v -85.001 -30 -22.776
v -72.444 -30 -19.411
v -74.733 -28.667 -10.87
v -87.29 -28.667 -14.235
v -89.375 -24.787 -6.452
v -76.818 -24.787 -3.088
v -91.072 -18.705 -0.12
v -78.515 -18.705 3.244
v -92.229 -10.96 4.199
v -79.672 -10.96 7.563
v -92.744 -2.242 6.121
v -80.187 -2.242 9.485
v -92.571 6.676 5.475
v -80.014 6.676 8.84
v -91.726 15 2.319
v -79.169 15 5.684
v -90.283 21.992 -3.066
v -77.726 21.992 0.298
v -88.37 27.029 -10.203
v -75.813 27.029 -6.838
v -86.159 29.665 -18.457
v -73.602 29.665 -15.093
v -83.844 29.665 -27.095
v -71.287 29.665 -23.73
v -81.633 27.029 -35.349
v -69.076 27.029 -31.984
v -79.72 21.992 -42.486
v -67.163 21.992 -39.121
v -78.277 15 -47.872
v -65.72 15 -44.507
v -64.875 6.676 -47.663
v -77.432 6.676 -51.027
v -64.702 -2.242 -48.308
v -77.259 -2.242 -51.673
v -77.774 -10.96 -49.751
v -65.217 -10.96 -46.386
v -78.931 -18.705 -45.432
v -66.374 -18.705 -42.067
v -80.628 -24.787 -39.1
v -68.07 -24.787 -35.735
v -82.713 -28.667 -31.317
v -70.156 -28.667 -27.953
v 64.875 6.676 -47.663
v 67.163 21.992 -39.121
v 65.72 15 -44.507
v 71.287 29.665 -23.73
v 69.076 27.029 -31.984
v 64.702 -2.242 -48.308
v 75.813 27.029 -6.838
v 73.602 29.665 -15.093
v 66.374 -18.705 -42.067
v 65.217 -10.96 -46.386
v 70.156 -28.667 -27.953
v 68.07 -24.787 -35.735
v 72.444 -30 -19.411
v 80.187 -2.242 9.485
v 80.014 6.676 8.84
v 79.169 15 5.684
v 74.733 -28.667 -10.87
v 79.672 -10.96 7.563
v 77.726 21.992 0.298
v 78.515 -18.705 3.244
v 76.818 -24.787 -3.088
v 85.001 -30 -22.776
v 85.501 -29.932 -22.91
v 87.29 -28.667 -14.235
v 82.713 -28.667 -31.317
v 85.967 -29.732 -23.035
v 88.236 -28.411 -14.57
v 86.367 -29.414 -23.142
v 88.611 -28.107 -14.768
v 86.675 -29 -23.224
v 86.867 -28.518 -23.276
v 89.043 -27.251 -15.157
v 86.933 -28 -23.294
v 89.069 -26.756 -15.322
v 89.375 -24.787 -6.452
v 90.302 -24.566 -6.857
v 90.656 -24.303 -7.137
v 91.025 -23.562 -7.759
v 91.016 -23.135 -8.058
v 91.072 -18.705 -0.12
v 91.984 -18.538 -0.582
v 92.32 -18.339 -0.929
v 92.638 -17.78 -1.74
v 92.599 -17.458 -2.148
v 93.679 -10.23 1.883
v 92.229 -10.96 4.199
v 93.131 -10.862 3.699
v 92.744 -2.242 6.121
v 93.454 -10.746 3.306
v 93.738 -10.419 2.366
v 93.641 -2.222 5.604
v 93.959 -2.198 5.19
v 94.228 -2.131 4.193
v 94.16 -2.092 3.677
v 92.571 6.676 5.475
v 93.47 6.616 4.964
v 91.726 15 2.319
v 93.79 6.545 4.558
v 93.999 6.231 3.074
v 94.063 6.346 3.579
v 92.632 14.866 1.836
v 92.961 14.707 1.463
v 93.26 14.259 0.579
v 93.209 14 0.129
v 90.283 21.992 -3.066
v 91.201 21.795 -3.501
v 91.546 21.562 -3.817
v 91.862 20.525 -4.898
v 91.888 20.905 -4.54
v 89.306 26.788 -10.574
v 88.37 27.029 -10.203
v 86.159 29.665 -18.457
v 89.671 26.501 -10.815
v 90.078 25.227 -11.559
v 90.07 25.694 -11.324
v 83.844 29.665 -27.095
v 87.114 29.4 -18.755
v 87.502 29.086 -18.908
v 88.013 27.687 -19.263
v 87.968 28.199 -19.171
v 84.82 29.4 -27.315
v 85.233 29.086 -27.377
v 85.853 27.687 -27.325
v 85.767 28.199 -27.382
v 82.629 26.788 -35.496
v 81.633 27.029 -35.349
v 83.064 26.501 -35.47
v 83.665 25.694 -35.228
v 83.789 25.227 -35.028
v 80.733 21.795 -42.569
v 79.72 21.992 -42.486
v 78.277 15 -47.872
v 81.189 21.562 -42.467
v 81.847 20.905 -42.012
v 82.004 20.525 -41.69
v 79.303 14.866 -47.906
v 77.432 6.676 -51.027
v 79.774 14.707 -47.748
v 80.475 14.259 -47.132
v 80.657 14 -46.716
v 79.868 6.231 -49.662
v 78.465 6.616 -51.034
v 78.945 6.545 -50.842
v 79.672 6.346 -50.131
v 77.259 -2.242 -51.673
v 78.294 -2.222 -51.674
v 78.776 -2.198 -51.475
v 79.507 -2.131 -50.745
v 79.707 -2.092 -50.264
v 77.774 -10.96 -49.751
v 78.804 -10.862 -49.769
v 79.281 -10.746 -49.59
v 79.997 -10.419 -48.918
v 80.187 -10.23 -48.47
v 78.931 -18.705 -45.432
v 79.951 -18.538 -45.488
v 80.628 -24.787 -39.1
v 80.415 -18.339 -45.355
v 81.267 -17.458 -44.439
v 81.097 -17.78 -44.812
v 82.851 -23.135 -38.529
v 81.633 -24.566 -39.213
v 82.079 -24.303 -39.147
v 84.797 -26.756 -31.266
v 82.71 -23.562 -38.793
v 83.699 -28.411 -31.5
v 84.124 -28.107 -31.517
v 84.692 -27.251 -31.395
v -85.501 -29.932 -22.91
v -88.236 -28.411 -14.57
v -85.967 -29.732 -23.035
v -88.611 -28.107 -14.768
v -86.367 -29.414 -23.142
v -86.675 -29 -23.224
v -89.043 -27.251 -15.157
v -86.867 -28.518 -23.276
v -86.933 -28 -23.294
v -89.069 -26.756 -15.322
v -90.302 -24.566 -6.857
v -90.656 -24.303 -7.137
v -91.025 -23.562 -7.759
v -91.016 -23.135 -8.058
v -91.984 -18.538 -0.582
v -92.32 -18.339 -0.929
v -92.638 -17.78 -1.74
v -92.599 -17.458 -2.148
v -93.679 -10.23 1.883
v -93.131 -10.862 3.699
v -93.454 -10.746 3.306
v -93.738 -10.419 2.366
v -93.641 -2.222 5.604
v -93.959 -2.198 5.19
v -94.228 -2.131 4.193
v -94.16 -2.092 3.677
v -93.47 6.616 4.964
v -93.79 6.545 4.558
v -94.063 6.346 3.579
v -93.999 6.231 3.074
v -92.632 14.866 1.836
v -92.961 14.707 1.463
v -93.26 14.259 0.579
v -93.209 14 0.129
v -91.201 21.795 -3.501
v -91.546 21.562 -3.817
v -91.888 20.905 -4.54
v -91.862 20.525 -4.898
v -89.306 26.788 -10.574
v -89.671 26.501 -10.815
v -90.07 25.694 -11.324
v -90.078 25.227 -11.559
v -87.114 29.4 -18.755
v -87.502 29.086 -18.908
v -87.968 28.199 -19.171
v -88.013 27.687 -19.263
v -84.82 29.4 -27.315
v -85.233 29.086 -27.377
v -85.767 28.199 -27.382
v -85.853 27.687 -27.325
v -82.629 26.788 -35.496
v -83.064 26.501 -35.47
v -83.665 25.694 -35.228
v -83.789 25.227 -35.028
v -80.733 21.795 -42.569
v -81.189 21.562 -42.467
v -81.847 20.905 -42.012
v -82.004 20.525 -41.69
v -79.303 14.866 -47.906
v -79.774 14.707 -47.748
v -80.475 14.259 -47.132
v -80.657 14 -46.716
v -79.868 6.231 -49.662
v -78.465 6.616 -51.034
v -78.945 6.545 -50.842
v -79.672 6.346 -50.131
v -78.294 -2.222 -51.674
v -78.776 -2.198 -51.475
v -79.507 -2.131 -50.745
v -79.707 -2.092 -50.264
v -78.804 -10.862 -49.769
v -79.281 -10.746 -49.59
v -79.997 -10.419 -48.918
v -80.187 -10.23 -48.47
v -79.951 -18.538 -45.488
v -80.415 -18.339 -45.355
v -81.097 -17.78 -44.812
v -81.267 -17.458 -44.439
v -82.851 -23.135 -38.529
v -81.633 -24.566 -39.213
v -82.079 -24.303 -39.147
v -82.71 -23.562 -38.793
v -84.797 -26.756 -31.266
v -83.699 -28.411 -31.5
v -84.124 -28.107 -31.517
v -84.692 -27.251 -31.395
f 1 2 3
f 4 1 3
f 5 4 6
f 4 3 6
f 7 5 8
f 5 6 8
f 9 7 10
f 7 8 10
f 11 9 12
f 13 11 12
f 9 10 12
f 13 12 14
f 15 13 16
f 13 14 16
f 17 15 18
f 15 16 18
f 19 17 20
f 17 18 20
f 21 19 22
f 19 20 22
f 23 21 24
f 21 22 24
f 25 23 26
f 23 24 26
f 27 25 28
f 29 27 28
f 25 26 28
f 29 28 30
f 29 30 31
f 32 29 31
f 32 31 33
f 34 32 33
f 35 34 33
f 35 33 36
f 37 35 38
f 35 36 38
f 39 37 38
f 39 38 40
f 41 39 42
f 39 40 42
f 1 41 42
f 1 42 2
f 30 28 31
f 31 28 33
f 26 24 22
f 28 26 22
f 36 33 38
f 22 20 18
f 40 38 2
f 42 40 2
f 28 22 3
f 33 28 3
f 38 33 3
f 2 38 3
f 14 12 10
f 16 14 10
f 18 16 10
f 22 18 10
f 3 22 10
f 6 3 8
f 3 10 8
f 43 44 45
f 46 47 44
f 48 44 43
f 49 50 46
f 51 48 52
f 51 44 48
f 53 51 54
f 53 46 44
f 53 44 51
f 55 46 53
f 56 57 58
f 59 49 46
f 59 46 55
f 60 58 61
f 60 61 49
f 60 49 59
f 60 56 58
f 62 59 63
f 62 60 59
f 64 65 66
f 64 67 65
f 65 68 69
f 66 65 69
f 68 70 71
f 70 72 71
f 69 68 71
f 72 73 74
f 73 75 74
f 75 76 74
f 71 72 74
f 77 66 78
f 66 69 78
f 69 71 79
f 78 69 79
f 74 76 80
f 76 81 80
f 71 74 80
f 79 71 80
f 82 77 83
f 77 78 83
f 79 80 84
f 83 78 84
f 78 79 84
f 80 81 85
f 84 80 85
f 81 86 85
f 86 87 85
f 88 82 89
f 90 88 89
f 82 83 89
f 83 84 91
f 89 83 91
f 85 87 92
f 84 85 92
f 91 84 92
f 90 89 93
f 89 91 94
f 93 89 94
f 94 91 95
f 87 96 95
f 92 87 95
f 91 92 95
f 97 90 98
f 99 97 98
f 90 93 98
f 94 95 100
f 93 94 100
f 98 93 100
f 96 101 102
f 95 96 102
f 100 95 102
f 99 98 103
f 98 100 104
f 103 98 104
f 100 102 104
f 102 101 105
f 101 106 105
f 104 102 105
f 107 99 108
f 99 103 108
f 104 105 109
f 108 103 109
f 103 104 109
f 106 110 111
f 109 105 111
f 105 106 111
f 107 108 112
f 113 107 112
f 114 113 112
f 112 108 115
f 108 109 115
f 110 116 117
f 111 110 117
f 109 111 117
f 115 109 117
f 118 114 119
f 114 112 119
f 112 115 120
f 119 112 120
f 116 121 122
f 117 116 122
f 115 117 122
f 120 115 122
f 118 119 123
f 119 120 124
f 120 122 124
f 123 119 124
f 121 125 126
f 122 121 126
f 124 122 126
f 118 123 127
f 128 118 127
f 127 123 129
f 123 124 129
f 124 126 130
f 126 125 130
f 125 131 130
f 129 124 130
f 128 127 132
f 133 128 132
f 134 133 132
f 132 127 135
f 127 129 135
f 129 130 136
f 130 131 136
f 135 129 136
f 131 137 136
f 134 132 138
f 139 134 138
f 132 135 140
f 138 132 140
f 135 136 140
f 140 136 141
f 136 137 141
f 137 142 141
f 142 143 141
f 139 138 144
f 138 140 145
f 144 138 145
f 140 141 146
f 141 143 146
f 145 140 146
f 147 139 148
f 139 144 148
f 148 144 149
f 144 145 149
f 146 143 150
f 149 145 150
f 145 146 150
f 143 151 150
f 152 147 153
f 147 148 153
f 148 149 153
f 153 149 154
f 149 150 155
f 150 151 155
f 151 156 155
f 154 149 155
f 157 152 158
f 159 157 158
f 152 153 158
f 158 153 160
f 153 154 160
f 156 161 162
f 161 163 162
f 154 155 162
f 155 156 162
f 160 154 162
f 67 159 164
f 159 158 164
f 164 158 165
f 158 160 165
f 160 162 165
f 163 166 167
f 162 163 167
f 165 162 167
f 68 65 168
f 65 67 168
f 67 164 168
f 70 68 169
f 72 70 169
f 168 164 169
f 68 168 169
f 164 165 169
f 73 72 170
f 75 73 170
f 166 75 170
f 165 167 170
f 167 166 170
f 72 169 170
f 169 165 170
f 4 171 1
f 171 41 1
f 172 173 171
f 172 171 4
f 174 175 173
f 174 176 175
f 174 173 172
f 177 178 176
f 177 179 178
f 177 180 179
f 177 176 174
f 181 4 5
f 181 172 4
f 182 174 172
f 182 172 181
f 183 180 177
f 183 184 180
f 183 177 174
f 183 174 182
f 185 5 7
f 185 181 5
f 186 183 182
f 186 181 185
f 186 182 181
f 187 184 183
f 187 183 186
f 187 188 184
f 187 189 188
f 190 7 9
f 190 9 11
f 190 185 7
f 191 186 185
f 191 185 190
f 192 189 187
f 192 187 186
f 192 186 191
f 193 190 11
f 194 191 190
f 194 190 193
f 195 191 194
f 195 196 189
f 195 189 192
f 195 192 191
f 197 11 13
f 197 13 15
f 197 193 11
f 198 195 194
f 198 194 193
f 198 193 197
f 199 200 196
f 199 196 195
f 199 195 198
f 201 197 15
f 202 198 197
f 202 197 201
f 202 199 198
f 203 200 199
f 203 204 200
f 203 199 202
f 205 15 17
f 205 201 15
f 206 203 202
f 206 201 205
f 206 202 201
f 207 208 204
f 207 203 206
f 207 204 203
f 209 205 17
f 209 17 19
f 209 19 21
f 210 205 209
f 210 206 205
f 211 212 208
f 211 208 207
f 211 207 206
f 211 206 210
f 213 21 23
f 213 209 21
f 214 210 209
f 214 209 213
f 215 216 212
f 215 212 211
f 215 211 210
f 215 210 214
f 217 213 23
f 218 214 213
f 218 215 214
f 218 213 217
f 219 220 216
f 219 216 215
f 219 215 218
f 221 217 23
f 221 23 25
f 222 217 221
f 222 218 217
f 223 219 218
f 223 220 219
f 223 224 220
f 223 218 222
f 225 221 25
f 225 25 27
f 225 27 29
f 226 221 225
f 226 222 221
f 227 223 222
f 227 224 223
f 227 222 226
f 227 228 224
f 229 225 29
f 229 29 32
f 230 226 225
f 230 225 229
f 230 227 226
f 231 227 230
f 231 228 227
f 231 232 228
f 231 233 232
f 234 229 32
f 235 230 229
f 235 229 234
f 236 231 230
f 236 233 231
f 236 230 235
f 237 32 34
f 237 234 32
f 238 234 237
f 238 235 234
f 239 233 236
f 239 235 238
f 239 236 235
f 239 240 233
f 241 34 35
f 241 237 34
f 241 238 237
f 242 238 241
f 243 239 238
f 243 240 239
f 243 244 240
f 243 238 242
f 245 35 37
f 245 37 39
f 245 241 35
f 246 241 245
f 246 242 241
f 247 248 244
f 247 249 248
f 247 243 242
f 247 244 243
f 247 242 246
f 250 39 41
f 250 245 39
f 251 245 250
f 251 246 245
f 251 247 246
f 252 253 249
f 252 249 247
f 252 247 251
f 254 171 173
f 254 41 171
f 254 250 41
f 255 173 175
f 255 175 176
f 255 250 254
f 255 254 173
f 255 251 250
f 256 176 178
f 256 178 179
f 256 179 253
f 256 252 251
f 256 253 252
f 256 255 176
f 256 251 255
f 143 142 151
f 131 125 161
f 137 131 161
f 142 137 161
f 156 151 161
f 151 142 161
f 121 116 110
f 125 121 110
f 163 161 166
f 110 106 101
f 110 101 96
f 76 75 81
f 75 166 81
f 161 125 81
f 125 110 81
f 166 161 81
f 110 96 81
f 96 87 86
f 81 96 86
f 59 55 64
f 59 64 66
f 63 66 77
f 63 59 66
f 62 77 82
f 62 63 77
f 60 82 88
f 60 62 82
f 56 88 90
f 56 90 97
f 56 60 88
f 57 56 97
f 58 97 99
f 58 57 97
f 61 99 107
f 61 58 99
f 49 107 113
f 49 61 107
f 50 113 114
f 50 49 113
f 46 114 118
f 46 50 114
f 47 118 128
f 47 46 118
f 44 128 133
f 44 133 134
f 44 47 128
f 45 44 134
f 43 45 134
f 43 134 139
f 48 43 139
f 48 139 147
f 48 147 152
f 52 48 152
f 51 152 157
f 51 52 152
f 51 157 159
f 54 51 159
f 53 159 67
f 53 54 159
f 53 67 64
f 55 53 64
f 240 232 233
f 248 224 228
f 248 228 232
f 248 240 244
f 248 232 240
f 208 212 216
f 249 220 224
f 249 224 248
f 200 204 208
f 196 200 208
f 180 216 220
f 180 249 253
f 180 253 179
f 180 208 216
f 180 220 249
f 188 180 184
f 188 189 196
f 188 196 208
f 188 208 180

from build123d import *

# Parameters (mm, degrees)
F2_R     = 30
F3_DEPTH = 15
F5_R     = 2


with BuildPart() as f3:
    # F2 (on face) → F3 (new body)
    with BuildSketch(Plane(origin=(-72.444437, 0, -19.411428), x_dir=(0, -1, 0), z_dir=(-0.965926, 0, -0.258819))):
        Circle(F2_R)
    extrude(amount=F3_DEPTH)

    # F5
    f5_edges = [f3.edges().sort_by_distance(p)[0] for p in [
        (-86.933324, 30, -23.293714),
    ]]
    fillet(f5_edges, radius=F5_R)


with BuildPart() as f4_1:
    # F4: instance of F3
    add(f3.part.mirror(Plane.YZ))


solid = Compound([f3.part, f4_1.part])
